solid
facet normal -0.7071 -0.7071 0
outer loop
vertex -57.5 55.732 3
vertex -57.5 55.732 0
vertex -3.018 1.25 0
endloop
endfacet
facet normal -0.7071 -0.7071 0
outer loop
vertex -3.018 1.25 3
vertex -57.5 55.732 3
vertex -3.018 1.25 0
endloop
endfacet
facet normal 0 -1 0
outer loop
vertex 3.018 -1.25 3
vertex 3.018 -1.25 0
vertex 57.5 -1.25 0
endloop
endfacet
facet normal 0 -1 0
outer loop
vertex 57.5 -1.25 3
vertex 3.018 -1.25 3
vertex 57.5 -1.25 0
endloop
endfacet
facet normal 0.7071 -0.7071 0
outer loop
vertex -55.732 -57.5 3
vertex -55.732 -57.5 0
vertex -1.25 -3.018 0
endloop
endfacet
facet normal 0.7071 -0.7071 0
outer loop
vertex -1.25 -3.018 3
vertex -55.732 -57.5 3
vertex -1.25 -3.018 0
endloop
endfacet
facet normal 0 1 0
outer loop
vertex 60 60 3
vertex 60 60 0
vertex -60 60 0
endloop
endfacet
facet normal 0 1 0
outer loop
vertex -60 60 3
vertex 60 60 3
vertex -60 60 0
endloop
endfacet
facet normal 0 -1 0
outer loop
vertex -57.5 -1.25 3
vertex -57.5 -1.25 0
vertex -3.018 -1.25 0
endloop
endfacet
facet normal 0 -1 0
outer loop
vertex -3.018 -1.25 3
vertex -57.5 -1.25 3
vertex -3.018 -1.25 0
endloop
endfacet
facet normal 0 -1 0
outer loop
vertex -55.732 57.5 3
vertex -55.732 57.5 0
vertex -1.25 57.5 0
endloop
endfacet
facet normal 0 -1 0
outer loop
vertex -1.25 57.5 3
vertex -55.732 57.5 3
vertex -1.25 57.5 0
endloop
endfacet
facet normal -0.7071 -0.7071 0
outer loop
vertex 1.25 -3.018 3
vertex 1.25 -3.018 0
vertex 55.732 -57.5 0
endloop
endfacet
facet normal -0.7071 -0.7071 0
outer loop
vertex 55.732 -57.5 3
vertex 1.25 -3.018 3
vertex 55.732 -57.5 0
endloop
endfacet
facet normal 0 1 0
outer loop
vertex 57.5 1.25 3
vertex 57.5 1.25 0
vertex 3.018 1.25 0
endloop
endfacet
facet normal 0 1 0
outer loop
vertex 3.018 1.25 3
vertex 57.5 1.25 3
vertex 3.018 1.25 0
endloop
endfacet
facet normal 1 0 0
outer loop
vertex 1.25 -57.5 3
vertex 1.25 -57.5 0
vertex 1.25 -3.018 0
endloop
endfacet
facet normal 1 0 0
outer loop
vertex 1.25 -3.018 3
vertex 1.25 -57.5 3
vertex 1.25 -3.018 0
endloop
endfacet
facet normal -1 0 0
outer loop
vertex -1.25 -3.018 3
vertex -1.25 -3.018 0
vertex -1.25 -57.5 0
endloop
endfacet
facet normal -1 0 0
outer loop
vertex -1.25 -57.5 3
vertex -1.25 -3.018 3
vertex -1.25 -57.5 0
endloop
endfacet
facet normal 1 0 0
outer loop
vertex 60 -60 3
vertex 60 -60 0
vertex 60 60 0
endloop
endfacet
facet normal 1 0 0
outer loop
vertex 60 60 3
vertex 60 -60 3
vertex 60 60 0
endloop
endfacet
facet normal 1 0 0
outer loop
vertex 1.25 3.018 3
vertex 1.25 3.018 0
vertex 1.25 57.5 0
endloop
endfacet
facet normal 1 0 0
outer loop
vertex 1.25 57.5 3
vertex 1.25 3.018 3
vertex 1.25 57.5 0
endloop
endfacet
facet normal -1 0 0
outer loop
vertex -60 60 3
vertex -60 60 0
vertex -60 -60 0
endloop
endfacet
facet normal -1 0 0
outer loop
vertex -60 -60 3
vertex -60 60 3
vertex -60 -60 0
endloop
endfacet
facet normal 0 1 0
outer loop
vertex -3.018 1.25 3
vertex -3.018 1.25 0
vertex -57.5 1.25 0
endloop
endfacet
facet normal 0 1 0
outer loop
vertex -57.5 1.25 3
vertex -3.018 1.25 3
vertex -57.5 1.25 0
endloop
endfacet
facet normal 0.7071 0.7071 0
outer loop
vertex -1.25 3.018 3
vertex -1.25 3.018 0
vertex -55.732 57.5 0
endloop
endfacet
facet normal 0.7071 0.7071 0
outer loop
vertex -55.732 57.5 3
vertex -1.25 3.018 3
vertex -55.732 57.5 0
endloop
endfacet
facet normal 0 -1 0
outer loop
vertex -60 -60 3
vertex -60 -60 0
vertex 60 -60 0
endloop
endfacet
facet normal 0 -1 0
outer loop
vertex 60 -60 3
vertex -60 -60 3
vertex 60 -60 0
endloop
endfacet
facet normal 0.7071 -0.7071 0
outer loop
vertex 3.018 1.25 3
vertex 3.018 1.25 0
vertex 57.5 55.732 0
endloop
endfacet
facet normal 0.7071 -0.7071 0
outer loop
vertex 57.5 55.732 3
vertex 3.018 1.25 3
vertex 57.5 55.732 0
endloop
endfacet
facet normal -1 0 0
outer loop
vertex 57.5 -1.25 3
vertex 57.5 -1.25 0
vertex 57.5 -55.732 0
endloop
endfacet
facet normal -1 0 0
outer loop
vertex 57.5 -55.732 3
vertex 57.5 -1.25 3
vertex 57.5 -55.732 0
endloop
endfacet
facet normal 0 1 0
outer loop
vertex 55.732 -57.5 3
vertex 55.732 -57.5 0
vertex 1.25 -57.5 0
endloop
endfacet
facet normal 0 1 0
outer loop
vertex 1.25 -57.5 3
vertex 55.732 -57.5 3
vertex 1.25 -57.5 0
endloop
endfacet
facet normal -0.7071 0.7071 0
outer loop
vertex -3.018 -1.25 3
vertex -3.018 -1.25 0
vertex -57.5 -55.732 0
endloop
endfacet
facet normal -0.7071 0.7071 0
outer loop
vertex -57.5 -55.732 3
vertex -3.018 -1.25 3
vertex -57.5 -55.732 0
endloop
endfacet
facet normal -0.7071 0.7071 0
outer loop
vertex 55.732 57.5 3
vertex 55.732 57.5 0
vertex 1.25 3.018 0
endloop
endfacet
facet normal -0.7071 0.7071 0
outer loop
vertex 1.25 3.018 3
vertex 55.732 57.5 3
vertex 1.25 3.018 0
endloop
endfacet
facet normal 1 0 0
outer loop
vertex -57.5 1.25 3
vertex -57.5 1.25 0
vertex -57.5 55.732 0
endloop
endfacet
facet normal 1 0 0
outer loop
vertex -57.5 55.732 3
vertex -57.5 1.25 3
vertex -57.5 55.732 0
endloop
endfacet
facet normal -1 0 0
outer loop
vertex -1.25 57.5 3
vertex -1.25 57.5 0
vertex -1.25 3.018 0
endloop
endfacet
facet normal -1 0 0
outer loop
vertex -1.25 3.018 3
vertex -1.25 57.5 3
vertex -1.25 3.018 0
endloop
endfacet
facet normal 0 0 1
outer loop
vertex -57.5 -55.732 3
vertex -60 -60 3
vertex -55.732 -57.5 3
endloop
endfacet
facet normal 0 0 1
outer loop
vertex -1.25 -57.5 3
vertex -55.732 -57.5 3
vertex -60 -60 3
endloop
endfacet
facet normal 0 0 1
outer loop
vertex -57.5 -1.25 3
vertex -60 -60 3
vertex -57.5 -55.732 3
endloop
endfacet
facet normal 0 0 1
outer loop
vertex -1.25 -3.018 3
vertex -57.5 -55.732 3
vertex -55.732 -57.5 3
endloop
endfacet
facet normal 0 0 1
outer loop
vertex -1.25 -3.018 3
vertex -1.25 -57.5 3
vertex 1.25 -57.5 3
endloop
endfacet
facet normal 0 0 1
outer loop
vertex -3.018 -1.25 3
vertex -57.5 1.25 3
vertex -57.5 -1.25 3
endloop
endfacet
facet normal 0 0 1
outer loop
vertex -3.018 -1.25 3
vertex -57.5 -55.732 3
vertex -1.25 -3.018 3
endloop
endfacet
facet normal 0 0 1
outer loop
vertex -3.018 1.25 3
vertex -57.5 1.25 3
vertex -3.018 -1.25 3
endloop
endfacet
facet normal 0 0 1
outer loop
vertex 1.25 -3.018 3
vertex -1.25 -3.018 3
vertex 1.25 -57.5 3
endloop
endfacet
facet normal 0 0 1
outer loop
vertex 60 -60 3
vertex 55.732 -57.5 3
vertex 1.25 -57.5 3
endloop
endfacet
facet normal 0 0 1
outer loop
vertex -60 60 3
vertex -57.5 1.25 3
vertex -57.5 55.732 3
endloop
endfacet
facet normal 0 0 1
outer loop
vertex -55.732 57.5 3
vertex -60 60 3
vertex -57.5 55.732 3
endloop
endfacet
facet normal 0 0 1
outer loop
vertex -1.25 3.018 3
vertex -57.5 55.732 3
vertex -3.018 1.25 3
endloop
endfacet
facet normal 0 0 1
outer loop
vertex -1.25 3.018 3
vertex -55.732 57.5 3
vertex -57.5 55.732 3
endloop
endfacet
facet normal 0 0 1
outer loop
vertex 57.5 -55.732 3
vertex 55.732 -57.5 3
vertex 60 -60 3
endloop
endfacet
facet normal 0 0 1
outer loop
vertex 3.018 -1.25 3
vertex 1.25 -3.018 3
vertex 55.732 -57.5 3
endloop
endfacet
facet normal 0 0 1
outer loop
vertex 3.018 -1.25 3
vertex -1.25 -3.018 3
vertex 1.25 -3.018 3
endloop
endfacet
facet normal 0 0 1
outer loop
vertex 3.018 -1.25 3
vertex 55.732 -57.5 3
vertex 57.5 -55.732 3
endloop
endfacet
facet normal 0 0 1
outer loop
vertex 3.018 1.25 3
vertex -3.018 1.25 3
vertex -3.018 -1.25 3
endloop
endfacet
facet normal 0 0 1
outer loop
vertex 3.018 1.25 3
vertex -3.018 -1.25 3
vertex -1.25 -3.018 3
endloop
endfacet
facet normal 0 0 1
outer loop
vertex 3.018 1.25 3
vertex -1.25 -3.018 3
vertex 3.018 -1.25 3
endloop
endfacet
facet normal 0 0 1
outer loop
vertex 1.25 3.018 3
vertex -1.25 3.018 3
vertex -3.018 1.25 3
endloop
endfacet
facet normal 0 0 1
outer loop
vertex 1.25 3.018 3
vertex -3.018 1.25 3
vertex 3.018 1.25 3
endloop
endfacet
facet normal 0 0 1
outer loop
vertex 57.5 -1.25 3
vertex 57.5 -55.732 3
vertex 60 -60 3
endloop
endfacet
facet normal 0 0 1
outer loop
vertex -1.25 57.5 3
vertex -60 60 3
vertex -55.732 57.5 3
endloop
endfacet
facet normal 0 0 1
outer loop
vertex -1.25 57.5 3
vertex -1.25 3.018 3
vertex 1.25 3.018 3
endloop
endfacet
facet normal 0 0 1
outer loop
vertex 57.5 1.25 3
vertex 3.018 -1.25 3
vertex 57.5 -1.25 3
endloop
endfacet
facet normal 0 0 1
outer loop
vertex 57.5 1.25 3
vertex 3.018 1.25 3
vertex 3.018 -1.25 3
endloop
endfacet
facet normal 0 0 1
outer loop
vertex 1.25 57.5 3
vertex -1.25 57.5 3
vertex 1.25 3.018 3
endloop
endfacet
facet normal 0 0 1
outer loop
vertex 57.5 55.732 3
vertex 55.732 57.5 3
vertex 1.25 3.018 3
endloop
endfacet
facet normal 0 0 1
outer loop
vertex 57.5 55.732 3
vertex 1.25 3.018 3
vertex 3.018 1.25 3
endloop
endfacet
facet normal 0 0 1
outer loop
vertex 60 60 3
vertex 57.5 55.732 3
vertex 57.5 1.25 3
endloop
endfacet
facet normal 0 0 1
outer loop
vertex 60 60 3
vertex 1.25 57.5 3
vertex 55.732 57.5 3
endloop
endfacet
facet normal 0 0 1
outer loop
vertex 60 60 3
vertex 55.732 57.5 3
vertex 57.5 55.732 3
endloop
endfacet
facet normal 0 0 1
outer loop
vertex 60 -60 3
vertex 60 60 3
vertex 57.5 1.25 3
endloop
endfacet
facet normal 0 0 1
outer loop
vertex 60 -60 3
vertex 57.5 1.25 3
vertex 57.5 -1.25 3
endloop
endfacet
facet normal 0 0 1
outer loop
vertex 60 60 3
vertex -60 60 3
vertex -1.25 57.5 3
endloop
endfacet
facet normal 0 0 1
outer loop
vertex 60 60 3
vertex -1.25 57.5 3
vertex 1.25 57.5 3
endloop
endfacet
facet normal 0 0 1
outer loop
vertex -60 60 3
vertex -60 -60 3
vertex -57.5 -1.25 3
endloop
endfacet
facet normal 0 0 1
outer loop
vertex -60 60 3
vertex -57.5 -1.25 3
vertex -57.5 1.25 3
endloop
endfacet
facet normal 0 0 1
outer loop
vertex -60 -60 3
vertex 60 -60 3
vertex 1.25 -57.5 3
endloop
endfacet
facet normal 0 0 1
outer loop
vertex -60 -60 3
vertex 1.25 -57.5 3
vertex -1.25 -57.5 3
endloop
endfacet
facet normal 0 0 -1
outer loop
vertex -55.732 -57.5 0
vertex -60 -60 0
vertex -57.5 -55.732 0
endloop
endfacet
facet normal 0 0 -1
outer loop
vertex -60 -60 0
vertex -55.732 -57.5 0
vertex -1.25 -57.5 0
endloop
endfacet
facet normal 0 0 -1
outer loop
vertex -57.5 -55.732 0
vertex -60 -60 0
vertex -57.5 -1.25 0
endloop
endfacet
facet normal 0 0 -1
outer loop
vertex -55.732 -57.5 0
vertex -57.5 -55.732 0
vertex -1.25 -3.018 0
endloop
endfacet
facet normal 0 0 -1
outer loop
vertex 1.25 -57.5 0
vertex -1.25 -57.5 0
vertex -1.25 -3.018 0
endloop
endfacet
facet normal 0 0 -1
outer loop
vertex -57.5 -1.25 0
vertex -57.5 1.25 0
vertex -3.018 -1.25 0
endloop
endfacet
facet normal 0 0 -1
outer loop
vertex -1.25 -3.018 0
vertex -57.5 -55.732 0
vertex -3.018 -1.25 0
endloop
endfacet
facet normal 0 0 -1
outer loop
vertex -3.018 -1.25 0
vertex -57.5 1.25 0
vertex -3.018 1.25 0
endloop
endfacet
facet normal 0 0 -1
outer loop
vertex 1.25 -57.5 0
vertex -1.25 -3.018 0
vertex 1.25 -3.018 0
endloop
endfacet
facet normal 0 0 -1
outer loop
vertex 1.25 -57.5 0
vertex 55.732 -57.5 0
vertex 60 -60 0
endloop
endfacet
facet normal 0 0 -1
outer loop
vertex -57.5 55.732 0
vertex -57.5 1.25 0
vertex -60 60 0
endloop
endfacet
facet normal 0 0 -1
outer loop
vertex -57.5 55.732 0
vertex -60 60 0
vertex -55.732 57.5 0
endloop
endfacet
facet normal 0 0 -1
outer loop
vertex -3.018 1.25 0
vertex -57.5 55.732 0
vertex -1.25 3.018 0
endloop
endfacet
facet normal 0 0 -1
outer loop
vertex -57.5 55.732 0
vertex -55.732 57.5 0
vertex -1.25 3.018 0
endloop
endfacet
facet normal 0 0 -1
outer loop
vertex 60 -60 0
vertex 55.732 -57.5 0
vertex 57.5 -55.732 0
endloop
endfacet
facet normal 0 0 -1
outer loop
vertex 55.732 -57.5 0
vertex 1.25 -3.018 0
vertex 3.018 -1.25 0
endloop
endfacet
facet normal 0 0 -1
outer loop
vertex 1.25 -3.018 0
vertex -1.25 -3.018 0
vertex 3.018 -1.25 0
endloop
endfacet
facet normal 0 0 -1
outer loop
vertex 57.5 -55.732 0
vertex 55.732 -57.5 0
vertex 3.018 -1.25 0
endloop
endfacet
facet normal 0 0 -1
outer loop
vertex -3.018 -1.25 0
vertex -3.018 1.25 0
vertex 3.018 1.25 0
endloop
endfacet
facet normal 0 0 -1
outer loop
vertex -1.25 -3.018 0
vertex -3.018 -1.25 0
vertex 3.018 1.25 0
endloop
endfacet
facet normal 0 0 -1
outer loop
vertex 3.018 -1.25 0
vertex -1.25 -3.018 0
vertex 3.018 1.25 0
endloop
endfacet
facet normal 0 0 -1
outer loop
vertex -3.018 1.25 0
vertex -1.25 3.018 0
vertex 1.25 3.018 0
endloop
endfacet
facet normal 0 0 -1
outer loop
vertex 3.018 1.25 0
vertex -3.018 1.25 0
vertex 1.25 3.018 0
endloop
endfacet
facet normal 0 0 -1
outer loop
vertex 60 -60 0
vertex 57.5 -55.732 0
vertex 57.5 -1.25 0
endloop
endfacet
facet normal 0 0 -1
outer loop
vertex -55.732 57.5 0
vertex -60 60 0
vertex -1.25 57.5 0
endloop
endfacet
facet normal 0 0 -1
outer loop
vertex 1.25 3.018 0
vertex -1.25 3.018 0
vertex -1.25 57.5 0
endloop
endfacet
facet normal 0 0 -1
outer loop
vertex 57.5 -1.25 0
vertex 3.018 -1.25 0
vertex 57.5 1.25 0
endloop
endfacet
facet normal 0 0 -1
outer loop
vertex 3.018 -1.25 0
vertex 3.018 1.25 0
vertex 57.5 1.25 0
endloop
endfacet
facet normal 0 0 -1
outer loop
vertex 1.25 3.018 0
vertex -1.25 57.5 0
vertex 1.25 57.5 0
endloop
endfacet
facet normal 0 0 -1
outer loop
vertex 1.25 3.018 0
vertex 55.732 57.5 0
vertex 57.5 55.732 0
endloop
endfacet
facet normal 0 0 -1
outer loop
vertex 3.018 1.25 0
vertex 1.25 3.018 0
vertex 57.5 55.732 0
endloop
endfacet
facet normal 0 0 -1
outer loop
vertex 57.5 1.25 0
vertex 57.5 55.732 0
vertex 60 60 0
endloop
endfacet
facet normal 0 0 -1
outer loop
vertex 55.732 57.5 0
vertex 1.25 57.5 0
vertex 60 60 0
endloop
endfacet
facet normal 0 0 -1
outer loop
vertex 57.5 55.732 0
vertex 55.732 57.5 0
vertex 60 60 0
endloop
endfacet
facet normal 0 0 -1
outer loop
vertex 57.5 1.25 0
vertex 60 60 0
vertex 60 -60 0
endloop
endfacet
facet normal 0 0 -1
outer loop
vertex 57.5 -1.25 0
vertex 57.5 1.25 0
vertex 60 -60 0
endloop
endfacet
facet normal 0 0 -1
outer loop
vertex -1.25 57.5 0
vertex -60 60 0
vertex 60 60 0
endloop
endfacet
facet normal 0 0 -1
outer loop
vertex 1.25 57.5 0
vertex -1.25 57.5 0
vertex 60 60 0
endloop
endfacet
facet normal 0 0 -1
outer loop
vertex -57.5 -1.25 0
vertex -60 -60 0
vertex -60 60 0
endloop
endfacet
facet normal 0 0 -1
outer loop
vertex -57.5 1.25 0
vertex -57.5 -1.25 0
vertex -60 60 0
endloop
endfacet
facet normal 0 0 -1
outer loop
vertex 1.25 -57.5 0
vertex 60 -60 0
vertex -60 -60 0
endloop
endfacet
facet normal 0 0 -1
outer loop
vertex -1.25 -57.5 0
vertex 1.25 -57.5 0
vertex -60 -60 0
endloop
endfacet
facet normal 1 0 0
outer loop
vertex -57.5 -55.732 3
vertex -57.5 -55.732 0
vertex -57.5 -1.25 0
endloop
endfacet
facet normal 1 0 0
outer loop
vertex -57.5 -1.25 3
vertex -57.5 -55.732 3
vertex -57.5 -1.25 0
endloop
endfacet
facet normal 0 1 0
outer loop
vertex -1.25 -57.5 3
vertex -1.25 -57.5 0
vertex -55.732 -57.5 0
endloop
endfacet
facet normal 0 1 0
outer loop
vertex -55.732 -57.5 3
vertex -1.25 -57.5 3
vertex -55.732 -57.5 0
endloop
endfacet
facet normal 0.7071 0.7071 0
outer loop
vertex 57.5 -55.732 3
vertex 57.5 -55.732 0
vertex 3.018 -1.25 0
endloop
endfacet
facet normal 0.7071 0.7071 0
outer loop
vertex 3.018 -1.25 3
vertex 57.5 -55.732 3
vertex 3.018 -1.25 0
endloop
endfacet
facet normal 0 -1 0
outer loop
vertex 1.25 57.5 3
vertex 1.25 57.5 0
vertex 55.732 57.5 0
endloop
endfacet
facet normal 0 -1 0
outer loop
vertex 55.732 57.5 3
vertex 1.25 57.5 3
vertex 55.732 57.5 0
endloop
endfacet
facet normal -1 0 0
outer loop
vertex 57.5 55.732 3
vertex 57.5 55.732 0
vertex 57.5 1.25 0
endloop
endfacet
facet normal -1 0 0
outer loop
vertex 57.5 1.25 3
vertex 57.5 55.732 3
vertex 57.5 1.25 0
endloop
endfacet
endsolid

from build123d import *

# Parameters (mm, degrees)
F1_DEPTH = 3


with BuildPart() as f1:
    # F0 (on Top) → F1 (new body)
    with BuildSketch(Plane.XY):
        Polygon((57.5, 57.5), (55.732233047, 57.5), (1.25, 3.017766953), (1.25, 1.25), align=None)
        Polygon((-55.732233047, -57.5), (-58.232233047, -60), (58.232233047, -60), (55.732233047, -57.5), (1.25, -57.5), (-1.25, -57.5), align=None)
        Polygon((57.5, -1.25), (57.5, 1.25), (3.017766953, 1.25), (1.767766953, 0), (3.017766953, -1.25), align=None)
        Polygon((1.25, 57.5), (-1.25, 57.5), (-1.25, 3.017766953), (0, 1.767766953), (1.25, 3.017766953), align=None)
        Polygon((-1.25, 1.25), (-57.5, 57.5), (-57.5, 55.732233047), (-3.017766953, 1.25), align=None)
        Polygon((-57.5, 55.732233047), (-60, 58.232233047), (-60, -58.232233047), (-57.5, -55.732233047), (-57.5, -1.25), (-57.5, 1.25), align=None)
        Polygon((-1.25, -1.25), (-57.5, -57.5), (-55.732233047, -57.5), (-1.25, -3.017766953), align=None)
        Polygon((-1.25, -3.017766953), (-1.25, -57.5), (1.25, -57.5), (1.25, -3.017766953), (0, -1.767766953), align=None)
        Polygon((-3.017766953, -1.25), (-57.5, -55.732233047), (-57.5, -57.5), (-1.25, -1.25), align=None)
        Polygon((58.232233047, 60), (-58.232233047, 60), (-55.732233047, 57.5), (-1.25, 57.5), (1.25, 57.5), (55.732233047, 57.5), align=None)
        Polygon((-3.017766953, 1.25), (-57.5, 1.25), (-57.5, -1.25), (-3.017766953, -1.25), (-1.767766953, 0), align=None)
        Polygon((57.5, 55.732233047), (57.5, 57.5), (1.25, 1.25), (3.017766953, 1.25), align=None)
        Polygon((60, -58.232233047), (60, 58.232233047), (57.5, 55.732233047), (57.5, 1.25), (57.5, -1.25), (57.5, -55.732233047), align=None)
        Polygon((3.017766953, 1.25), (1.25, 1.25), (1.25, 0.517766953), (1.767766953, 0), align=None)
        Polygon((57.5, -57.5), (57.5, -55.732233047), (3.017766953, -1.25), (1.25, -1.25), align=None)
        Polygon((-1.25, 3.017766953), (-1.25, 1.25), (-0.517766953, 1.25), (0, 1.767766953), align=None)
        Polygon((-0.517766953, -1.25), (-1.25, -1.25), (-1.25, -3.017766953), (0, -1.767766953), align=None)
        Polygon((-58.232233047, 60), (-60, 60), (-57.5, 57.5), (-55.732233047, 57.5), align=None)
        Polygon((60, 60), (58.232233047, 60), (55.732233047, 57.5), (57.5, 57.5), align=None)
        Polygon((-57.5, -57.5), (-60, -60), (-58.232233047, -60), (-55.732233047, -57.5), align=None)
        Polygon((55.732233047, -57.5), (58.232233047, -60), (60, -60), (57.5, -57.5), align=None)
        Polygon((-57.5, 57.5), (-60, 60), (-60, 58.232233047), (-57.5, 55.732233047), align=None)
        Polygon((-57.5, -55.732233047), (-60, -58.232233047), (-60, -60), (-57.5, -57.5), align=None)
        Polygon((60, -60), (60, -58.232233047), (57.5, -55.732233047), (57.5, -57.5), align=None)
        Polygon((1.25, -3.017766953), (1.25, -1.25), (0.517766953, -1.25), (0, -1.767766953), align=None)
        Polygon((1.25, -0.517766953), (1.25, -1.25), (3.017766953, -1.25), (1.767766953, 0), align=None)
        Polygon((1.25, 1.25), (1.25, 3.017766953), (0, 1.767766953), (0.517766953, 1.25), align=None)
        Polygon((-55.732233047, 57.5), (-57.5, 57.5), (-1.25, 1.25), (-1.25, 3.017766953), align=None)
        Polygon((-1.25, 0.517766953), (-1.25, 1.25), (-3.017766953, 1.25), (-1.767766953, 0), align=None)
        Polygon((1.25, -3.017766953), (55.732233047, -57.5), (57.5, -57.5), (1.25, -1.25), align=None)
        Polygon((-1.767766953, 0), (-3.017766953, -1.25), (-1.25, -1.25), (-1.25, -0.517766953), align=None)
        Polygon((0, 0), (-0.8838834765, 0.8838834765), (-1.25, 0.517766953), (-1.25, -0.517766953), (-0.8838834765, -0.8838834765), align=None)
        Polygon((-0.517766953, 1.25), (-0.8838834765, 0.8838834765), (0, 0), (0.8838834765, 0.8838834765), (0.517766953, 1.25), align=None)
        Polygon((-0.8838834765, -0.8838834765), (-1.25, -1.25), (-0.517766953, -1.25), align=None)
        Polygon((-1.25, -0.517766953), (-1.25, 0.517766953), (-1.767766953, 0), align=None)
        Polygon((-0.517766953, 1.25), (-1.25, 1.25), (-0.8838834765, 0.8838834765), align=None)
        Polygon((1.25, -0.517766953), (0.8838834765, -0.8838834765), (1.25, -1.25), align=None)
        Polygon((1.25, 1.25), (0.517766953, 1.25), (0.8838834765, 0.8838834765), align=None)
        Polygon((60, 58.232233047), (60, 60), (57.5, 57.5), (57.5, 55.732233047), align=None)
        Polygon((0.517766953, -1.25), (-0.517766953, -1.25), (0, -1.767766953), align=None)
        Polygon((0.8838834765, -0.8838834765), (0, 0), (-0.8838834765, -0.8838834765), (-0.517766953, -1.25), (0.517766953, -1.25), align=None)
        Polygon((0.8838834765, 0.8838834765), (0, 0), (0.8838834765, -0.8838834765), (1.25, -0.517766953), (1.25, 0.517766953), align=None)
        Polygon((0, 1.767766953), (-0.517766953, 1.25), (0.517766953, 1.25), align=None)
        Polygon((1.767766953, 0), (1.25, 0.517766953), (1.25, -0.517766953), align=None)
        Polygon((1.25, -1.25), (0.8838834765, -0.8838834765), (0.517766953, -1.25), align=None)
        Polygon((-0.8838834765, 0.8838834765), (-1.25, 1.25), (-1.25, 0.517766953), align=None)
        Polygon((1.25, 0.517766953), (1.25, 1.25), (0.8838834765, 0.8838834765), align=None)
        Polygon((-0.8838834765, -0.8838834765), (-1.25, -0.517766953), (-1.25, -1.25), align=None)
    extrude(amount=F1_DEPTH)


solid = f1.part
